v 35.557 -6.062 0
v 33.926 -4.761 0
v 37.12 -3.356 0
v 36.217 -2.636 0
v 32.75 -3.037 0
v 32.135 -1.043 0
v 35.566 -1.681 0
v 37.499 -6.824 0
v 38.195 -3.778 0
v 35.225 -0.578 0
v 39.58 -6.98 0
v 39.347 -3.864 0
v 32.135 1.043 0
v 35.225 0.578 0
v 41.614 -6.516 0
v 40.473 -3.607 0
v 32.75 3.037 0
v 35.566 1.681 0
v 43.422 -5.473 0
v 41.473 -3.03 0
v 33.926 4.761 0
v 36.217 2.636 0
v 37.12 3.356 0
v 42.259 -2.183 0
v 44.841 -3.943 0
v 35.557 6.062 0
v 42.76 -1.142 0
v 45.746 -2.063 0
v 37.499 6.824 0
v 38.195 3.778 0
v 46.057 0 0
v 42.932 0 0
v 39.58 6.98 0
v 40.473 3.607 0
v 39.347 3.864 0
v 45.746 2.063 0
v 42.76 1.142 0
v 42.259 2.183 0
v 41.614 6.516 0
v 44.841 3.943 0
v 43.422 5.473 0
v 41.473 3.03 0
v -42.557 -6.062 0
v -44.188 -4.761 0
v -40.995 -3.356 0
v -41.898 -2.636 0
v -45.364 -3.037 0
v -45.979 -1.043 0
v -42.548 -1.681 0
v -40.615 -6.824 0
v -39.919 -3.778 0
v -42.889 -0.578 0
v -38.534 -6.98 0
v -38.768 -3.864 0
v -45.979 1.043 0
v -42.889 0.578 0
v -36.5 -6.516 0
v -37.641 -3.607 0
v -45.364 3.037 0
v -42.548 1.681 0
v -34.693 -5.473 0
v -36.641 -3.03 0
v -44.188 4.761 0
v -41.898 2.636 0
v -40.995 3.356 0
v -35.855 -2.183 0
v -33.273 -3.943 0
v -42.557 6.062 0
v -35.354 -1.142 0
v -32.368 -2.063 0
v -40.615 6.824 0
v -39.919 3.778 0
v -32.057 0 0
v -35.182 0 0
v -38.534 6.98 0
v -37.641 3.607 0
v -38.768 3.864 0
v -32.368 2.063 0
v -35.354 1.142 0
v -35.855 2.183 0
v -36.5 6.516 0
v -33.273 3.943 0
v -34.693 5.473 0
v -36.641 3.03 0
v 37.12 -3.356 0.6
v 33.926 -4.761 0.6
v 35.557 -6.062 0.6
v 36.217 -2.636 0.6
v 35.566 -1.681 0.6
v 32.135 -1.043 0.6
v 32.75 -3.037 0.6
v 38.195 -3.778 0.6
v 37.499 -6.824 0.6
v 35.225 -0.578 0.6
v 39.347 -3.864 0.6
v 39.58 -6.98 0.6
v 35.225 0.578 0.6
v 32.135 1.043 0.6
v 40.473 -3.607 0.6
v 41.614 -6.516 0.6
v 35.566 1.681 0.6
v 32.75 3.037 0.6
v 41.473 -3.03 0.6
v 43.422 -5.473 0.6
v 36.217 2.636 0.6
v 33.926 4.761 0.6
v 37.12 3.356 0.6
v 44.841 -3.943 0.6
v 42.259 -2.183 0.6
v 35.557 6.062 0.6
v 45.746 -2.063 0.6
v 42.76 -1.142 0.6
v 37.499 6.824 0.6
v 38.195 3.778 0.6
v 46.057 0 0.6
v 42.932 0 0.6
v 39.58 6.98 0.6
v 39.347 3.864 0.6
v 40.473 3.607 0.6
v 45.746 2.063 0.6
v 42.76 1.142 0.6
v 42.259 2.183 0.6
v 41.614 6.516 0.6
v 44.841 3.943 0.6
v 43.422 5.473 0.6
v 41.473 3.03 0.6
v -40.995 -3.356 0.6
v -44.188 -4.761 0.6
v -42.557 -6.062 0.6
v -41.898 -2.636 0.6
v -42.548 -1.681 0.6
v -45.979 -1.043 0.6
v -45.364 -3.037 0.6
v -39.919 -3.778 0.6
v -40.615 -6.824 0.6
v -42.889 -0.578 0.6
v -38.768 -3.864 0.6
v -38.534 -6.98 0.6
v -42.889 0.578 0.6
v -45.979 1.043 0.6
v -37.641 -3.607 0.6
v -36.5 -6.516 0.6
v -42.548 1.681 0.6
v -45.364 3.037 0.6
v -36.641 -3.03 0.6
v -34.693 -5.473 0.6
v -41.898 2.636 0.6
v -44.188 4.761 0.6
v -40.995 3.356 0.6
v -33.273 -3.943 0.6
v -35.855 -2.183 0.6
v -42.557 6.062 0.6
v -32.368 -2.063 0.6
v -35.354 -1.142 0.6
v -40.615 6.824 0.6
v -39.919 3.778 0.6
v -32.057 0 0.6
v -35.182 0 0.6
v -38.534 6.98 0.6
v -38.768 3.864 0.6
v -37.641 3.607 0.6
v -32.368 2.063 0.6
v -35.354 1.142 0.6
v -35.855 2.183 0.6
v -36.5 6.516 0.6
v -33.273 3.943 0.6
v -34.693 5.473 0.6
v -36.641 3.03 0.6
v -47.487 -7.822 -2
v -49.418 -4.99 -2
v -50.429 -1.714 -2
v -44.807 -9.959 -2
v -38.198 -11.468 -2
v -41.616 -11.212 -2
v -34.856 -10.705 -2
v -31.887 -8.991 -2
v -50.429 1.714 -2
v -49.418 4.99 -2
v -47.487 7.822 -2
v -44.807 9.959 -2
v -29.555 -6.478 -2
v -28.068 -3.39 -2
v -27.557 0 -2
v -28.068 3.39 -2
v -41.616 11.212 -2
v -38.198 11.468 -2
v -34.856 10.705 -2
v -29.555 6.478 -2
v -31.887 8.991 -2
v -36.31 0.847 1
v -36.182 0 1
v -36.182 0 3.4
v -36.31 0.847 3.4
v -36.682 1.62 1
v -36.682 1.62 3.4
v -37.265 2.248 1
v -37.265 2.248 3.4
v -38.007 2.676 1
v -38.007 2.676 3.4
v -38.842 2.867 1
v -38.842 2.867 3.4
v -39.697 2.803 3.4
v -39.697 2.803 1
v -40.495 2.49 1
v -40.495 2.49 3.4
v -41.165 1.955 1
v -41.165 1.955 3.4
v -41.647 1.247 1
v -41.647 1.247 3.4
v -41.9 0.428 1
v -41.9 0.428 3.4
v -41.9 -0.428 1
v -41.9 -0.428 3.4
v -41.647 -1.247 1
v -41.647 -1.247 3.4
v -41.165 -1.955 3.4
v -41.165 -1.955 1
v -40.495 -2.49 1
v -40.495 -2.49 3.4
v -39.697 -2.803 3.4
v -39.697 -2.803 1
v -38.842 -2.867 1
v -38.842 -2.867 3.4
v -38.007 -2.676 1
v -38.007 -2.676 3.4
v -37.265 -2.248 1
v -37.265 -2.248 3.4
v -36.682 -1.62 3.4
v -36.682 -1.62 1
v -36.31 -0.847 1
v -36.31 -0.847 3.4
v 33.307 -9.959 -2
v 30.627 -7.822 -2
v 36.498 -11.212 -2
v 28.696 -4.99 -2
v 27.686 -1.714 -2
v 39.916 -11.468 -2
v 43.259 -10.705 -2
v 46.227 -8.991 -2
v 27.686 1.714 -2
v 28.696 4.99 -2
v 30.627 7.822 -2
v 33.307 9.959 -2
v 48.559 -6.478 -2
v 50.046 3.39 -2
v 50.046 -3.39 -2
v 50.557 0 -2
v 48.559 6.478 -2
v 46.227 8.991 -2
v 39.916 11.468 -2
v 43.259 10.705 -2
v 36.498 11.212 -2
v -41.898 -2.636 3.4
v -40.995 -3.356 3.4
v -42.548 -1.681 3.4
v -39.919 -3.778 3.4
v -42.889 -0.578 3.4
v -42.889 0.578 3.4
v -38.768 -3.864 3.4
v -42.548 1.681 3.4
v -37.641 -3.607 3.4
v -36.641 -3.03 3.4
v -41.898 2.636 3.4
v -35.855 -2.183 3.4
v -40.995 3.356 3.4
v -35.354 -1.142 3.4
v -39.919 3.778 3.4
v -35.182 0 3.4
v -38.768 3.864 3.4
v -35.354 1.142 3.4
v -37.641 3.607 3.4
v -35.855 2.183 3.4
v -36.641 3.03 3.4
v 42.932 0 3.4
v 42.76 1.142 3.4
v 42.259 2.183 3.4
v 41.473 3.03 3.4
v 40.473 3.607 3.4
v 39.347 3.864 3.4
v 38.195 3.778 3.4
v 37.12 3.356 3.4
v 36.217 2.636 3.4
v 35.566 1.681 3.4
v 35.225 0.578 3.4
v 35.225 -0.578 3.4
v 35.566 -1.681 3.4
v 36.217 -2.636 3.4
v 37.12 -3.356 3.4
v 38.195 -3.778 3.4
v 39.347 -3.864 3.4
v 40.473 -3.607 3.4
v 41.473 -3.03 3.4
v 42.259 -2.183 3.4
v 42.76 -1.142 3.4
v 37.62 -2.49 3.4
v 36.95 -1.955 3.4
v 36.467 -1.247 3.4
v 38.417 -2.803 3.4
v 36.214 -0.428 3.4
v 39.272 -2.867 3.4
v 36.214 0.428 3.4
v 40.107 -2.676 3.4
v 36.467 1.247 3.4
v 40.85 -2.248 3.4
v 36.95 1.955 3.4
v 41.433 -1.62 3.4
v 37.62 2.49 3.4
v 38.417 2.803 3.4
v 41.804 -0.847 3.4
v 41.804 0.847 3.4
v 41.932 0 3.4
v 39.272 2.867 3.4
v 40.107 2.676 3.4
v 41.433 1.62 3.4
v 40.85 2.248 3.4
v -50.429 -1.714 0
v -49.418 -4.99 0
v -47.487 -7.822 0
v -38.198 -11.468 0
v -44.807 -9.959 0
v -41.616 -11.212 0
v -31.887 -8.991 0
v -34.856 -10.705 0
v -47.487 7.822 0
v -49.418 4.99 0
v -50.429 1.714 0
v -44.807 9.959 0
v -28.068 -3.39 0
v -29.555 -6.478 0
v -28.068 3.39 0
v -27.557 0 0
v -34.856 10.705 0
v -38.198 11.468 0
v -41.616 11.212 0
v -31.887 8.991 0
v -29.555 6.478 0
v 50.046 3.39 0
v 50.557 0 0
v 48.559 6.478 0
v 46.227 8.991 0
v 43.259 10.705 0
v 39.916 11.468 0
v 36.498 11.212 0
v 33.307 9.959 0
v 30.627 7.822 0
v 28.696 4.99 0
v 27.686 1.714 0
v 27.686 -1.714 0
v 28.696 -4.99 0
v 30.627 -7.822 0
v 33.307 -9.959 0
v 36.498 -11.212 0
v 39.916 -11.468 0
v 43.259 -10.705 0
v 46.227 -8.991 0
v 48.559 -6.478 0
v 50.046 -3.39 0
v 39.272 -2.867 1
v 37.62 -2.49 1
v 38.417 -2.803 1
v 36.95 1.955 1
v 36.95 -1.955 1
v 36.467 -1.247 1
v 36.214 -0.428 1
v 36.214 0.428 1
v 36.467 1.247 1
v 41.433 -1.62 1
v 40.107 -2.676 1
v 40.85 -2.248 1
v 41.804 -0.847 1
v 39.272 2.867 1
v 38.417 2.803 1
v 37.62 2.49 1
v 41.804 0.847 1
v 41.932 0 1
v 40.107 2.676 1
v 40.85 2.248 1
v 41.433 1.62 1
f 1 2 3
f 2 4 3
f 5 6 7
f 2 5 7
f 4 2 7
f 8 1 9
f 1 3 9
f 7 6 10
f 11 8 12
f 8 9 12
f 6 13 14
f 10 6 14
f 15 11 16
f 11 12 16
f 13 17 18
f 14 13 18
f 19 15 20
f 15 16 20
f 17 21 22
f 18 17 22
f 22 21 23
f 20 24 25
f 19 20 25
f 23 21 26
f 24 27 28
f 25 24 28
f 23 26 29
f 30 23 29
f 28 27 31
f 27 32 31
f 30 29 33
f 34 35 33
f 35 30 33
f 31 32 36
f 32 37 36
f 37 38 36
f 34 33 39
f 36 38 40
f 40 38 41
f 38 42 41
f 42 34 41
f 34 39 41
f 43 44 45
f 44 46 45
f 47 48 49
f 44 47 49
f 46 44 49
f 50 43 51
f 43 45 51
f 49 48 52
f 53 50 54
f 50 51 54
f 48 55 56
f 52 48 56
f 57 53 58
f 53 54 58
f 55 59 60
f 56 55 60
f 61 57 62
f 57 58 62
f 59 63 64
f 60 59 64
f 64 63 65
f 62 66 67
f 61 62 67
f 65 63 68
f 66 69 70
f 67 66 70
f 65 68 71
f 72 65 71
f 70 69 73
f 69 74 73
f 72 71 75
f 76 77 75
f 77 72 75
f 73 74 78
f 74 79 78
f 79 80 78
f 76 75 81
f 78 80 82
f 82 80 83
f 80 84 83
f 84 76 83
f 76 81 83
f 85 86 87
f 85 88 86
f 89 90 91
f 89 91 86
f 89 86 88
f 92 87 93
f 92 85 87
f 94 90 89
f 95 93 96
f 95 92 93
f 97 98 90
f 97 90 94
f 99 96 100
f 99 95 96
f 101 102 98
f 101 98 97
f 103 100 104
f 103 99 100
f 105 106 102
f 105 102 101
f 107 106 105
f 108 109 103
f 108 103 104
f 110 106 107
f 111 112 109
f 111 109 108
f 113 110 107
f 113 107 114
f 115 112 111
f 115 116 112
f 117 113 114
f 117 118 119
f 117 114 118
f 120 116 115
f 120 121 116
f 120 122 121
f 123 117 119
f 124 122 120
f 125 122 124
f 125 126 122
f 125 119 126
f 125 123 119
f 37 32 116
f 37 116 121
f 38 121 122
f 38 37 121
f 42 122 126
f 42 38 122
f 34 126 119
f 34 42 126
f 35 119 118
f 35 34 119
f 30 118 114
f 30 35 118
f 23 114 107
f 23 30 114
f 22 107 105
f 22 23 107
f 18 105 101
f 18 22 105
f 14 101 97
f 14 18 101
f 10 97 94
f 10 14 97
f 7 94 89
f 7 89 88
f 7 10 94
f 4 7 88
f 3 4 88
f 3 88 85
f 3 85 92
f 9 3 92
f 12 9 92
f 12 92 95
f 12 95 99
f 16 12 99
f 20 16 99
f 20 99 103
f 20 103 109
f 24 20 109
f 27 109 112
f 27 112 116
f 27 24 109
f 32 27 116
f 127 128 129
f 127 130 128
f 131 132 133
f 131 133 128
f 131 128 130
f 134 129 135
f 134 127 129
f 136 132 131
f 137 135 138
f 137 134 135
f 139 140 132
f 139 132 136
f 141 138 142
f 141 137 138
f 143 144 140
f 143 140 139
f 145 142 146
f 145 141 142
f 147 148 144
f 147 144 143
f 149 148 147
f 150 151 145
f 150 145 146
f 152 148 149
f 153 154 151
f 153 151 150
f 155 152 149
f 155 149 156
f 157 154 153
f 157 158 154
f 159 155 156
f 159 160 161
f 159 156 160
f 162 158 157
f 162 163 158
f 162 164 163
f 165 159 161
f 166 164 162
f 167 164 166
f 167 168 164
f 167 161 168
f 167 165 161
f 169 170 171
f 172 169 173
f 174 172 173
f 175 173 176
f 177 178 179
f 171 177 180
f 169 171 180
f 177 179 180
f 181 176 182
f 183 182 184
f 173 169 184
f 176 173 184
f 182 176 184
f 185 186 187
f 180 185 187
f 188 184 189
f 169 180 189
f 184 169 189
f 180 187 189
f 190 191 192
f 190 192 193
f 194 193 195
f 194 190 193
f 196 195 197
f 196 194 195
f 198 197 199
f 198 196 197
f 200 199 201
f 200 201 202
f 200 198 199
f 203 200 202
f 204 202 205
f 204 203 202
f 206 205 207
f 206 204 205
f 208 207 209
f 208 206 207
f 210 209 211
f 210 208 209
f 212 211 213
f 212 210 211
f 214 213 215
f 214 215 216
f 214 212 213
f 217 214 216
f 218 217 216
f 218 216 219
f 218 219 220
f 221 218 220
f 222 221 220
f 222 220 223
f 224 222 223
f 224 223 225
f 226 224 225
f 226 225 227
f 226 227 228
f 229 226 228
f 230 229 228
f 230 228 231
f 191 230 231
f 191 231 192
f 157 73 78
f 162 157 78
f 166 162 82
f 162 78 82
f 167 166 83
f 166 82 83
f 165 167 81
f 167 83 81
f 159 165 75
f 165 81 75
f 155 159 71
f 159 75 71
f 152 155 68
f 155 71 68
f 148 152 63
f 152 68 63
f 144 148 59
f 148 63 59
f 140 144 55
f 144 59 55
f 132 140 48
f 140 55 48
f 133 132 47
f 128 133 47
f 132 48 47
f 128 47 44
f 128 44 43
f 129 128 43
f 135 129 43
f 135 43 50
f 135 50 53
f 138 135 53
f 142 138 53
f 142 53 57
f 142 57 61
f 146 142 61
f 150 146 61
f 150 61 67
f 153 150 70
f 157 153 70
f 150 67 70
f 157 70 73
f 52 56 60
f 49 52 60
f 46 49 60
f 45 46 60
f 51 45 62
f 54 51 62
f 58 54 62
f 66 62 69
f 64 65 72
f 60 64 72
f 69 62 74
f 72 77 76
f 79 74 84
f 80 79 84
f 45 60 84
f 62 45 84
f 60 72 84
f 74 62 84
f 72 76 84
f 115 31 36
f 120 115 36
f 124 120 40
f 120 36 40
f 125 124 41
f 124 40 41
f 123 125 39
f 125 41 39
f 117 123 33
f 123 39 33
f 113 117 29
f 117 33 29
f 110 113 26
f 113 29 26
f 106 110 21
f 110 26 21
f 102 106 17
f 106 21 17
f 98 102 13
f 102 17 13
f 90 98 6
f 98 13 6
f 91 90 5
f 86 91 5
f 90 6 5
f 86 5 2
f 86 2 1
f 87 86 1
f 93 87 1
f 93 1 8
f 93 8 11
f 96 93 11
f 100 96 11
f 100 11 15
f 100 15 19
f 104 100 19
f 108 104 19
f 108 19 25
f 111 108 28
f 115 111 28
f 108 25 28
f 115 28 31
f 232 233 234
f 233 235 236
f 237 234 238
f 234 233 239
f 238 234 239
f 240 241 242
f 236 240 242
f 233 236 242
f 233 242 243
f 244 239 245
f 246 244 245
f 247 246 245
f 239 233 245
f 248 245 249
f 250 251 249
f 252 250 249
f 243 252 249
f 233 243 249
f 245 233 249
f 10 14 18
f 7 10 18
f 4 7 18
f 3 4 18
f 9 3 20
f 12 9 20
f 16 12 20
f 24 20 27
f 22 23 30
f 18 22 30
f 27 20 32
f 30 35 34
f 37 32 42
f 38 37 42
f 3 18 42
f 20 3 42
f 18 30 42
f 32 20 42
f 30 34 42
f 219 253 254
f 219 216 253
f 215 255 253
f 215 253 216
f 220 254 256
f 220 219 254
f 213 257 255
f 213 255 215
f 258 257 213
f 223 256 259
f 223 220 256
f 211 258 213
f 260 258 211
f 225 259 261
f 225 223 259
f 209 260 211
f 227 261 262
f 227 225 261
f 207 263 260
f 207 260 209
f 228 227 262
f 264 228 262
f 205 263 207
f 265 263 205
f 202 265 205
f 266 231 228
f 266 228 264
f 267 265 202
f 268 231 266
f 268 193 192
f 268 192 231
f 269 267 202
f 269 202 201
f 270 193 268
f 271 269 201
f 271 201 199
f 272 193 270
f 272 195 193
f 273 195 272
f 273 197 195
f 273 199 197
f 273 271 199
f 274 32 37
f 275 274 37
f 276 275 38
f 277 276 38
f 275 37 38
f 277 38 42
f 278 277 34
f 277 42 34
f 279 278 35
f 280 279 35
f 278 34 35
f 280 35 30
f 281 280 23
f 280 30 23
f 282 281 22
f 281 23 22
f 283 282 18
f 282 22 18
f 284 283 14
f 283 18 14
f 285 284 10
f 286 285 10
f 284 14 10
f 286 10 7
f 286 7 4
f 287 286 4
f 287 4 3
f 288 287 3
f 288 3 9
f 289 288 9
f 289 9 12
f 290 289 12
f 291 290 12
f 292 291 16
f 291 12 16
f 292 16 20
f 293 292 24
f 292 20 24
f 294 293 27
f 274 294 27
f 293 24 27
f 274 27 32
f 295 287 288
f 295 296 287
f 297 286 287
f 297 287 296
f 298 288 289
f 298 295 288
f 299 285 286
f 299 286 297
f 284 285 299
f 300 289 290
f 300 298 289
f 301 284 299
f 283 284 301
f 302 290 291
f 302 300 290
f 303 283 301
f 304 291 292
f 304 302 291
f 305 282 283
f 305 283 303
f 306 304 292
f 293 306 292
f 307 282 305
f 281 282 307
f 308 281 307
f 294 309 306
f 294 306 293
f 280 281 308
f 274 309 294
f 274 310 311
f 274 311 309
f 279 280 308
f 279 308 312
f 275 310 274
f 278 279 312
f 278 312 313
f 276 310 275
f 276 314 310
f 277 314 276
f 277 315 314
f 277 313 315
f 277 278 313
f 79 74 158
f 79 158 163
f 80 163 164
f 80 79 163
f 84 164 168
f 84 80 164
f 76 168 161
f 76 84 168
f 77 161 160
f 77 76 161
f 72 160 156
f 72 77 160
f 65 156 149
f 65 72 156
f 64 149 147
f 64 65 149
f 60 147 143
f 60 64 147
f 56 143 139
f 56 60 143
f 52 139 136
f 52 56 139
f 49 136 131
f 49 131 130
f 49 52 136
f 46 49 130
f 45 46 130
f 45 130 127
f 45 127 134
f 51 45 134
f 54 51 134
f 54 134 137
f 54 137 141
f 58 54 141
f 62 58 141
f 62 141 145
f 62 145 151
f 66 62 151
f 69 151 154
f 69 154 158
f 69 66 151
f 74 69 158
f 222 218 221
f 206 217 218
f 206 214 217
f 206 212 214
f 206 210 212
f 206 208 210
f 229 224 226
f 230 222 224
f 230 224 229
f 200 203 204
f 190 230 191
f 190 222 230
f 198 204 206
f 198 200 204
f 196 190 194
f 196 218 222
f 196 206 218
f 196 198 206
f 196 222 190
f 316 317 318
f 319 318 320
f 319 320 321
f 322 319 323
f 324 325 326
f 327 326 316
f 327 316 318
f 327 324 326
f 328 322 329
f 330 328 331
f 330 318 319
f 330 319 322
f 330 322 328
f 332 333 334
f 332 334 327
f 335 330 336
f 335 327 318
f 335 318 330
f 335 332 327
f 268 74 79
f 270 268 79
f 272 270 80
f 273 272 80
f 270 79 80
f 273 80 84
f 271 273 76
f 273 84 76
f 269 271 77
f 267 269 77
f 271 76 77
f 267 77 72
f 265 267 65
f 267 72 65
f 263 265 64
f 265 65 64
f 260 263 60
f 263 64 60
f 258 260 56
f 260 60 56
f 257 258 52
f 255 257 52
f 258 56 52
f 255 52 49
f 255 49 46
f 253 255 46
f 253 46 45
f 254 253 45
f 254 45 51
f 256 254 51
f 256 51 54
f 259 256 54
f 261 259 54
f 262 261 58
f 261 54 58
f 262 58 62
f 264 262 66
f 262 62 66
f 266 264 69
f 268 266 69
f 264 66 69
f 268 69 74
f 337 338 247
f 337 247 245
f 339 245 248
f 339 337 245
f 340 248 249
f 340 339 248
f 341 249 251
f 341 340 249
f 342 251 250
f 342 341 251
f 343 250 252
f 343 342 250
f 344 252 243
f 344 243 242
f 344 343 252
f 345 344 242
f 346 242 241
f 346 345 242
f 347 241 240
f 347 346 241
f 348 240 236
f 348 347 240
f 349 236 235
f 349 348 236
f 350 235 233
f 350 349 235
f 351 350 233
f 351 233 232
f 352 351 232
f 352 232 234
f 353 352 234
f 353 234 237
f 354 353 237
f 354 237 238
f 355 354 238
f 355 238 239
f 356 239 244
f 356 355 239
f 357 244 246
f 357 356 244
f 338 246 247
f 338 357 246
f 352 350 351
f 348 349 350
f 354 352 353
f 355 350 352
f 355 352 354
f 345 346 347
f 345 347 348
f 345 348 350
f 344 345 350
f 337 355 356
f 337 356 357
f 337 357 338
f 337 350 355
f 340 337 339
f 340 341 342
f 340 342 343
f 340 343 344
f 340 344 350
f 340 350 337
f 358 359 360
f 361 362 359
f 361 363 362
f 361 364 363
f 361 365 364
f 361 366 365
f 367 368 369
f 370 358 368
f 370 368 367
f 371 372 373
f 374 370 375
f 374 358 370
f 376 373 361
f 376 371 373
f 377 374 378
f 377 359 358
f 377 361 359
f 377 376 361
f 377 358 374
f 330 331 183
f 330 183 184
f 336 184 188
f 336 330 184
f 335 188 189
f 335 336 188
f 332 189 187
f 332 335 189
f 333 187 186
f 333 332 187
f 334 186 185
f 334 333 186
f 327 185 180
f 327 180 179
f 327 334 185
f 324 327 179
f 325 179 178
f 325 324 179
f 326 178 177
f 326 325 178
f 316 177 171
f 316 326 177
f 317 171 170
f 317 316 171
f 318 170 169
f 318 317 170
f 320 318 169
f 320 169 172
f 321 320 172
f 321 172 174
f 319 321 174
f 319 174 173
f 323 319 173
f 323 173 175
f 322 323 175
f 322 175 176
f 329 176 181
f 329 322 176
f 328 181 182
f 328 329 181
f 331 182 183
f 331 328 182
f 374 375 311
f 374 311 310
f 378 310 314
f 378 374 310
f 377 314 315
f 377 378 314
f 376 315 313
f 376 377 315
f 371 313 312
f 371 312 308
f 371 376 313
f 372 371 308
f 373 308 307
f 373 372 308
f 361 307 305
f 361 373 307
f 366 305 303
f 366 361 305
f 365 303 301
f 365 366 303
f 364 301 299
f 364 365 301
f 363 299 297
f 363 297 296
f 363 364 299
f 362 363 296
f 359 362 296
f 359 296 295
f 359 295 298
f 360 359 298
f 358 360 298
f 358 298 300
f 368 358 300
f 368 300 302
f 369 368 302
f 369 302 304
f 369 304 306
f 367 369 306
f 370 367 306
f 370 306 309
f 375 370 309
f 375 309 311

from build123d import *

# Parameters (mm, degrees)
F0_R     = 3.875
F1_DEPTH = 3.4
F0_R_2   = 7
F2_DEPTH = 0.6
F0_R_3   = 11.5
F3_DEPTH = 2
F4_T     = -1
F4_2_T   = -1


with BuildPart() as f1:
    # F0 (on Top) → F1 (new body)
    with BuildSketch(Plane.XY):
        with Locations((-39.0570946038, 0)):
            Circle(F0_R)
    extrude(amount=F1_DEPTH)

    # F4
    f4_openings = [f1.faces().sort_by_distance(p)[0] for p in [
        (-39.057095, 0, 3.4),
    ]]
    offset(amount=F4_T, openings=f4_openings)


with BuildPart() as f1b:
    # F0 (on Top) → F1, piece 2 (new body)
    with BuildSketch(Plane.XY):
        with Locations((39.0570946038, 0)):
            Circle(F0_R)
    extrude(amount=F1_DEPTH)

    # F4#2
    f4_2_openings = [f1b.faces().sort_by_distance(p)[0] for p in [
        (39.057095, 0, 3.4),
    ]]
    offset(amount=F4_2_T, openings=f4_2_openings)


with BuildPart() as f2:
    # F0 (on Top) → F2 (new body)
    with BuildSketch(Plane.XY):
        with Locations((-39.0570946038, 0)):
            Circle(F0_R_2)
        with Locations((-39.0570946038, 0)):
            Circle(F0_R, mode=Mode.SUBTRACT)
    extrude(amount=F2_DEPTH)


with BuildPart() as f2b:
    # F0 (on Top) → F2, piece 2 (new body)
    with BuildSketch(Plane.XY):
        with Locations((39.0570946038, 0)):
            Circle(F0_R_2)
        with Locations((39.0570946038, 0)):
            Circle(F0_R, mode=Mode.SUBTRACT)
    extrude(amount=F2_DEPTH)


with BuildPart() as f3:
    # F0 (on Top) → F3 (new body)
    with BuildSketch(Plane.XY):
        with Locations((-39.0570946038, 0)):
            Circle(F0_R_3)
        with Locations((-39.0570946038, 0)):
            Circle(F0_R_2, mode=Mode.SUBTRACT)
        with Locations((-39.0570946038, 0)):
            Circle(F0_R_2)
        with Locations((-39.0570946038, 0)):
            Circle(F0_R, mode=Mode.SUBTRACT)
        with Locations((-39.0570946038, 0)):
            Circle(F0_R)
    extrude(amount=-F3_DEPTH)


with BuildPart() as f3b:
    # F0 (on Top) → F3, piece 2 (new body)
    with BuildSketch(Plane.XY):
        with Locations((39.0570946038, 0)):
            Circle(F0_R_3)
        with Locations((39.0570946038, 0)):
            Circle(F0_R_2, mode=Mode.SUBTRACT)
        with Locations((39.0570946038, 0)):
            Circle(F0_R_2)
        with Locations((39.0570946038, 0)):
            Circle(F0_R, mode=Mode.SUBTRACT)
        with Locations((39.0570946038, 0)):
            Circle(F0_R)
    extrude(amount=-F3_DEPTH)


solid = Compound([f1.part, f1b.part, f2.part, f2b.part, f3.part, f3b.part])
